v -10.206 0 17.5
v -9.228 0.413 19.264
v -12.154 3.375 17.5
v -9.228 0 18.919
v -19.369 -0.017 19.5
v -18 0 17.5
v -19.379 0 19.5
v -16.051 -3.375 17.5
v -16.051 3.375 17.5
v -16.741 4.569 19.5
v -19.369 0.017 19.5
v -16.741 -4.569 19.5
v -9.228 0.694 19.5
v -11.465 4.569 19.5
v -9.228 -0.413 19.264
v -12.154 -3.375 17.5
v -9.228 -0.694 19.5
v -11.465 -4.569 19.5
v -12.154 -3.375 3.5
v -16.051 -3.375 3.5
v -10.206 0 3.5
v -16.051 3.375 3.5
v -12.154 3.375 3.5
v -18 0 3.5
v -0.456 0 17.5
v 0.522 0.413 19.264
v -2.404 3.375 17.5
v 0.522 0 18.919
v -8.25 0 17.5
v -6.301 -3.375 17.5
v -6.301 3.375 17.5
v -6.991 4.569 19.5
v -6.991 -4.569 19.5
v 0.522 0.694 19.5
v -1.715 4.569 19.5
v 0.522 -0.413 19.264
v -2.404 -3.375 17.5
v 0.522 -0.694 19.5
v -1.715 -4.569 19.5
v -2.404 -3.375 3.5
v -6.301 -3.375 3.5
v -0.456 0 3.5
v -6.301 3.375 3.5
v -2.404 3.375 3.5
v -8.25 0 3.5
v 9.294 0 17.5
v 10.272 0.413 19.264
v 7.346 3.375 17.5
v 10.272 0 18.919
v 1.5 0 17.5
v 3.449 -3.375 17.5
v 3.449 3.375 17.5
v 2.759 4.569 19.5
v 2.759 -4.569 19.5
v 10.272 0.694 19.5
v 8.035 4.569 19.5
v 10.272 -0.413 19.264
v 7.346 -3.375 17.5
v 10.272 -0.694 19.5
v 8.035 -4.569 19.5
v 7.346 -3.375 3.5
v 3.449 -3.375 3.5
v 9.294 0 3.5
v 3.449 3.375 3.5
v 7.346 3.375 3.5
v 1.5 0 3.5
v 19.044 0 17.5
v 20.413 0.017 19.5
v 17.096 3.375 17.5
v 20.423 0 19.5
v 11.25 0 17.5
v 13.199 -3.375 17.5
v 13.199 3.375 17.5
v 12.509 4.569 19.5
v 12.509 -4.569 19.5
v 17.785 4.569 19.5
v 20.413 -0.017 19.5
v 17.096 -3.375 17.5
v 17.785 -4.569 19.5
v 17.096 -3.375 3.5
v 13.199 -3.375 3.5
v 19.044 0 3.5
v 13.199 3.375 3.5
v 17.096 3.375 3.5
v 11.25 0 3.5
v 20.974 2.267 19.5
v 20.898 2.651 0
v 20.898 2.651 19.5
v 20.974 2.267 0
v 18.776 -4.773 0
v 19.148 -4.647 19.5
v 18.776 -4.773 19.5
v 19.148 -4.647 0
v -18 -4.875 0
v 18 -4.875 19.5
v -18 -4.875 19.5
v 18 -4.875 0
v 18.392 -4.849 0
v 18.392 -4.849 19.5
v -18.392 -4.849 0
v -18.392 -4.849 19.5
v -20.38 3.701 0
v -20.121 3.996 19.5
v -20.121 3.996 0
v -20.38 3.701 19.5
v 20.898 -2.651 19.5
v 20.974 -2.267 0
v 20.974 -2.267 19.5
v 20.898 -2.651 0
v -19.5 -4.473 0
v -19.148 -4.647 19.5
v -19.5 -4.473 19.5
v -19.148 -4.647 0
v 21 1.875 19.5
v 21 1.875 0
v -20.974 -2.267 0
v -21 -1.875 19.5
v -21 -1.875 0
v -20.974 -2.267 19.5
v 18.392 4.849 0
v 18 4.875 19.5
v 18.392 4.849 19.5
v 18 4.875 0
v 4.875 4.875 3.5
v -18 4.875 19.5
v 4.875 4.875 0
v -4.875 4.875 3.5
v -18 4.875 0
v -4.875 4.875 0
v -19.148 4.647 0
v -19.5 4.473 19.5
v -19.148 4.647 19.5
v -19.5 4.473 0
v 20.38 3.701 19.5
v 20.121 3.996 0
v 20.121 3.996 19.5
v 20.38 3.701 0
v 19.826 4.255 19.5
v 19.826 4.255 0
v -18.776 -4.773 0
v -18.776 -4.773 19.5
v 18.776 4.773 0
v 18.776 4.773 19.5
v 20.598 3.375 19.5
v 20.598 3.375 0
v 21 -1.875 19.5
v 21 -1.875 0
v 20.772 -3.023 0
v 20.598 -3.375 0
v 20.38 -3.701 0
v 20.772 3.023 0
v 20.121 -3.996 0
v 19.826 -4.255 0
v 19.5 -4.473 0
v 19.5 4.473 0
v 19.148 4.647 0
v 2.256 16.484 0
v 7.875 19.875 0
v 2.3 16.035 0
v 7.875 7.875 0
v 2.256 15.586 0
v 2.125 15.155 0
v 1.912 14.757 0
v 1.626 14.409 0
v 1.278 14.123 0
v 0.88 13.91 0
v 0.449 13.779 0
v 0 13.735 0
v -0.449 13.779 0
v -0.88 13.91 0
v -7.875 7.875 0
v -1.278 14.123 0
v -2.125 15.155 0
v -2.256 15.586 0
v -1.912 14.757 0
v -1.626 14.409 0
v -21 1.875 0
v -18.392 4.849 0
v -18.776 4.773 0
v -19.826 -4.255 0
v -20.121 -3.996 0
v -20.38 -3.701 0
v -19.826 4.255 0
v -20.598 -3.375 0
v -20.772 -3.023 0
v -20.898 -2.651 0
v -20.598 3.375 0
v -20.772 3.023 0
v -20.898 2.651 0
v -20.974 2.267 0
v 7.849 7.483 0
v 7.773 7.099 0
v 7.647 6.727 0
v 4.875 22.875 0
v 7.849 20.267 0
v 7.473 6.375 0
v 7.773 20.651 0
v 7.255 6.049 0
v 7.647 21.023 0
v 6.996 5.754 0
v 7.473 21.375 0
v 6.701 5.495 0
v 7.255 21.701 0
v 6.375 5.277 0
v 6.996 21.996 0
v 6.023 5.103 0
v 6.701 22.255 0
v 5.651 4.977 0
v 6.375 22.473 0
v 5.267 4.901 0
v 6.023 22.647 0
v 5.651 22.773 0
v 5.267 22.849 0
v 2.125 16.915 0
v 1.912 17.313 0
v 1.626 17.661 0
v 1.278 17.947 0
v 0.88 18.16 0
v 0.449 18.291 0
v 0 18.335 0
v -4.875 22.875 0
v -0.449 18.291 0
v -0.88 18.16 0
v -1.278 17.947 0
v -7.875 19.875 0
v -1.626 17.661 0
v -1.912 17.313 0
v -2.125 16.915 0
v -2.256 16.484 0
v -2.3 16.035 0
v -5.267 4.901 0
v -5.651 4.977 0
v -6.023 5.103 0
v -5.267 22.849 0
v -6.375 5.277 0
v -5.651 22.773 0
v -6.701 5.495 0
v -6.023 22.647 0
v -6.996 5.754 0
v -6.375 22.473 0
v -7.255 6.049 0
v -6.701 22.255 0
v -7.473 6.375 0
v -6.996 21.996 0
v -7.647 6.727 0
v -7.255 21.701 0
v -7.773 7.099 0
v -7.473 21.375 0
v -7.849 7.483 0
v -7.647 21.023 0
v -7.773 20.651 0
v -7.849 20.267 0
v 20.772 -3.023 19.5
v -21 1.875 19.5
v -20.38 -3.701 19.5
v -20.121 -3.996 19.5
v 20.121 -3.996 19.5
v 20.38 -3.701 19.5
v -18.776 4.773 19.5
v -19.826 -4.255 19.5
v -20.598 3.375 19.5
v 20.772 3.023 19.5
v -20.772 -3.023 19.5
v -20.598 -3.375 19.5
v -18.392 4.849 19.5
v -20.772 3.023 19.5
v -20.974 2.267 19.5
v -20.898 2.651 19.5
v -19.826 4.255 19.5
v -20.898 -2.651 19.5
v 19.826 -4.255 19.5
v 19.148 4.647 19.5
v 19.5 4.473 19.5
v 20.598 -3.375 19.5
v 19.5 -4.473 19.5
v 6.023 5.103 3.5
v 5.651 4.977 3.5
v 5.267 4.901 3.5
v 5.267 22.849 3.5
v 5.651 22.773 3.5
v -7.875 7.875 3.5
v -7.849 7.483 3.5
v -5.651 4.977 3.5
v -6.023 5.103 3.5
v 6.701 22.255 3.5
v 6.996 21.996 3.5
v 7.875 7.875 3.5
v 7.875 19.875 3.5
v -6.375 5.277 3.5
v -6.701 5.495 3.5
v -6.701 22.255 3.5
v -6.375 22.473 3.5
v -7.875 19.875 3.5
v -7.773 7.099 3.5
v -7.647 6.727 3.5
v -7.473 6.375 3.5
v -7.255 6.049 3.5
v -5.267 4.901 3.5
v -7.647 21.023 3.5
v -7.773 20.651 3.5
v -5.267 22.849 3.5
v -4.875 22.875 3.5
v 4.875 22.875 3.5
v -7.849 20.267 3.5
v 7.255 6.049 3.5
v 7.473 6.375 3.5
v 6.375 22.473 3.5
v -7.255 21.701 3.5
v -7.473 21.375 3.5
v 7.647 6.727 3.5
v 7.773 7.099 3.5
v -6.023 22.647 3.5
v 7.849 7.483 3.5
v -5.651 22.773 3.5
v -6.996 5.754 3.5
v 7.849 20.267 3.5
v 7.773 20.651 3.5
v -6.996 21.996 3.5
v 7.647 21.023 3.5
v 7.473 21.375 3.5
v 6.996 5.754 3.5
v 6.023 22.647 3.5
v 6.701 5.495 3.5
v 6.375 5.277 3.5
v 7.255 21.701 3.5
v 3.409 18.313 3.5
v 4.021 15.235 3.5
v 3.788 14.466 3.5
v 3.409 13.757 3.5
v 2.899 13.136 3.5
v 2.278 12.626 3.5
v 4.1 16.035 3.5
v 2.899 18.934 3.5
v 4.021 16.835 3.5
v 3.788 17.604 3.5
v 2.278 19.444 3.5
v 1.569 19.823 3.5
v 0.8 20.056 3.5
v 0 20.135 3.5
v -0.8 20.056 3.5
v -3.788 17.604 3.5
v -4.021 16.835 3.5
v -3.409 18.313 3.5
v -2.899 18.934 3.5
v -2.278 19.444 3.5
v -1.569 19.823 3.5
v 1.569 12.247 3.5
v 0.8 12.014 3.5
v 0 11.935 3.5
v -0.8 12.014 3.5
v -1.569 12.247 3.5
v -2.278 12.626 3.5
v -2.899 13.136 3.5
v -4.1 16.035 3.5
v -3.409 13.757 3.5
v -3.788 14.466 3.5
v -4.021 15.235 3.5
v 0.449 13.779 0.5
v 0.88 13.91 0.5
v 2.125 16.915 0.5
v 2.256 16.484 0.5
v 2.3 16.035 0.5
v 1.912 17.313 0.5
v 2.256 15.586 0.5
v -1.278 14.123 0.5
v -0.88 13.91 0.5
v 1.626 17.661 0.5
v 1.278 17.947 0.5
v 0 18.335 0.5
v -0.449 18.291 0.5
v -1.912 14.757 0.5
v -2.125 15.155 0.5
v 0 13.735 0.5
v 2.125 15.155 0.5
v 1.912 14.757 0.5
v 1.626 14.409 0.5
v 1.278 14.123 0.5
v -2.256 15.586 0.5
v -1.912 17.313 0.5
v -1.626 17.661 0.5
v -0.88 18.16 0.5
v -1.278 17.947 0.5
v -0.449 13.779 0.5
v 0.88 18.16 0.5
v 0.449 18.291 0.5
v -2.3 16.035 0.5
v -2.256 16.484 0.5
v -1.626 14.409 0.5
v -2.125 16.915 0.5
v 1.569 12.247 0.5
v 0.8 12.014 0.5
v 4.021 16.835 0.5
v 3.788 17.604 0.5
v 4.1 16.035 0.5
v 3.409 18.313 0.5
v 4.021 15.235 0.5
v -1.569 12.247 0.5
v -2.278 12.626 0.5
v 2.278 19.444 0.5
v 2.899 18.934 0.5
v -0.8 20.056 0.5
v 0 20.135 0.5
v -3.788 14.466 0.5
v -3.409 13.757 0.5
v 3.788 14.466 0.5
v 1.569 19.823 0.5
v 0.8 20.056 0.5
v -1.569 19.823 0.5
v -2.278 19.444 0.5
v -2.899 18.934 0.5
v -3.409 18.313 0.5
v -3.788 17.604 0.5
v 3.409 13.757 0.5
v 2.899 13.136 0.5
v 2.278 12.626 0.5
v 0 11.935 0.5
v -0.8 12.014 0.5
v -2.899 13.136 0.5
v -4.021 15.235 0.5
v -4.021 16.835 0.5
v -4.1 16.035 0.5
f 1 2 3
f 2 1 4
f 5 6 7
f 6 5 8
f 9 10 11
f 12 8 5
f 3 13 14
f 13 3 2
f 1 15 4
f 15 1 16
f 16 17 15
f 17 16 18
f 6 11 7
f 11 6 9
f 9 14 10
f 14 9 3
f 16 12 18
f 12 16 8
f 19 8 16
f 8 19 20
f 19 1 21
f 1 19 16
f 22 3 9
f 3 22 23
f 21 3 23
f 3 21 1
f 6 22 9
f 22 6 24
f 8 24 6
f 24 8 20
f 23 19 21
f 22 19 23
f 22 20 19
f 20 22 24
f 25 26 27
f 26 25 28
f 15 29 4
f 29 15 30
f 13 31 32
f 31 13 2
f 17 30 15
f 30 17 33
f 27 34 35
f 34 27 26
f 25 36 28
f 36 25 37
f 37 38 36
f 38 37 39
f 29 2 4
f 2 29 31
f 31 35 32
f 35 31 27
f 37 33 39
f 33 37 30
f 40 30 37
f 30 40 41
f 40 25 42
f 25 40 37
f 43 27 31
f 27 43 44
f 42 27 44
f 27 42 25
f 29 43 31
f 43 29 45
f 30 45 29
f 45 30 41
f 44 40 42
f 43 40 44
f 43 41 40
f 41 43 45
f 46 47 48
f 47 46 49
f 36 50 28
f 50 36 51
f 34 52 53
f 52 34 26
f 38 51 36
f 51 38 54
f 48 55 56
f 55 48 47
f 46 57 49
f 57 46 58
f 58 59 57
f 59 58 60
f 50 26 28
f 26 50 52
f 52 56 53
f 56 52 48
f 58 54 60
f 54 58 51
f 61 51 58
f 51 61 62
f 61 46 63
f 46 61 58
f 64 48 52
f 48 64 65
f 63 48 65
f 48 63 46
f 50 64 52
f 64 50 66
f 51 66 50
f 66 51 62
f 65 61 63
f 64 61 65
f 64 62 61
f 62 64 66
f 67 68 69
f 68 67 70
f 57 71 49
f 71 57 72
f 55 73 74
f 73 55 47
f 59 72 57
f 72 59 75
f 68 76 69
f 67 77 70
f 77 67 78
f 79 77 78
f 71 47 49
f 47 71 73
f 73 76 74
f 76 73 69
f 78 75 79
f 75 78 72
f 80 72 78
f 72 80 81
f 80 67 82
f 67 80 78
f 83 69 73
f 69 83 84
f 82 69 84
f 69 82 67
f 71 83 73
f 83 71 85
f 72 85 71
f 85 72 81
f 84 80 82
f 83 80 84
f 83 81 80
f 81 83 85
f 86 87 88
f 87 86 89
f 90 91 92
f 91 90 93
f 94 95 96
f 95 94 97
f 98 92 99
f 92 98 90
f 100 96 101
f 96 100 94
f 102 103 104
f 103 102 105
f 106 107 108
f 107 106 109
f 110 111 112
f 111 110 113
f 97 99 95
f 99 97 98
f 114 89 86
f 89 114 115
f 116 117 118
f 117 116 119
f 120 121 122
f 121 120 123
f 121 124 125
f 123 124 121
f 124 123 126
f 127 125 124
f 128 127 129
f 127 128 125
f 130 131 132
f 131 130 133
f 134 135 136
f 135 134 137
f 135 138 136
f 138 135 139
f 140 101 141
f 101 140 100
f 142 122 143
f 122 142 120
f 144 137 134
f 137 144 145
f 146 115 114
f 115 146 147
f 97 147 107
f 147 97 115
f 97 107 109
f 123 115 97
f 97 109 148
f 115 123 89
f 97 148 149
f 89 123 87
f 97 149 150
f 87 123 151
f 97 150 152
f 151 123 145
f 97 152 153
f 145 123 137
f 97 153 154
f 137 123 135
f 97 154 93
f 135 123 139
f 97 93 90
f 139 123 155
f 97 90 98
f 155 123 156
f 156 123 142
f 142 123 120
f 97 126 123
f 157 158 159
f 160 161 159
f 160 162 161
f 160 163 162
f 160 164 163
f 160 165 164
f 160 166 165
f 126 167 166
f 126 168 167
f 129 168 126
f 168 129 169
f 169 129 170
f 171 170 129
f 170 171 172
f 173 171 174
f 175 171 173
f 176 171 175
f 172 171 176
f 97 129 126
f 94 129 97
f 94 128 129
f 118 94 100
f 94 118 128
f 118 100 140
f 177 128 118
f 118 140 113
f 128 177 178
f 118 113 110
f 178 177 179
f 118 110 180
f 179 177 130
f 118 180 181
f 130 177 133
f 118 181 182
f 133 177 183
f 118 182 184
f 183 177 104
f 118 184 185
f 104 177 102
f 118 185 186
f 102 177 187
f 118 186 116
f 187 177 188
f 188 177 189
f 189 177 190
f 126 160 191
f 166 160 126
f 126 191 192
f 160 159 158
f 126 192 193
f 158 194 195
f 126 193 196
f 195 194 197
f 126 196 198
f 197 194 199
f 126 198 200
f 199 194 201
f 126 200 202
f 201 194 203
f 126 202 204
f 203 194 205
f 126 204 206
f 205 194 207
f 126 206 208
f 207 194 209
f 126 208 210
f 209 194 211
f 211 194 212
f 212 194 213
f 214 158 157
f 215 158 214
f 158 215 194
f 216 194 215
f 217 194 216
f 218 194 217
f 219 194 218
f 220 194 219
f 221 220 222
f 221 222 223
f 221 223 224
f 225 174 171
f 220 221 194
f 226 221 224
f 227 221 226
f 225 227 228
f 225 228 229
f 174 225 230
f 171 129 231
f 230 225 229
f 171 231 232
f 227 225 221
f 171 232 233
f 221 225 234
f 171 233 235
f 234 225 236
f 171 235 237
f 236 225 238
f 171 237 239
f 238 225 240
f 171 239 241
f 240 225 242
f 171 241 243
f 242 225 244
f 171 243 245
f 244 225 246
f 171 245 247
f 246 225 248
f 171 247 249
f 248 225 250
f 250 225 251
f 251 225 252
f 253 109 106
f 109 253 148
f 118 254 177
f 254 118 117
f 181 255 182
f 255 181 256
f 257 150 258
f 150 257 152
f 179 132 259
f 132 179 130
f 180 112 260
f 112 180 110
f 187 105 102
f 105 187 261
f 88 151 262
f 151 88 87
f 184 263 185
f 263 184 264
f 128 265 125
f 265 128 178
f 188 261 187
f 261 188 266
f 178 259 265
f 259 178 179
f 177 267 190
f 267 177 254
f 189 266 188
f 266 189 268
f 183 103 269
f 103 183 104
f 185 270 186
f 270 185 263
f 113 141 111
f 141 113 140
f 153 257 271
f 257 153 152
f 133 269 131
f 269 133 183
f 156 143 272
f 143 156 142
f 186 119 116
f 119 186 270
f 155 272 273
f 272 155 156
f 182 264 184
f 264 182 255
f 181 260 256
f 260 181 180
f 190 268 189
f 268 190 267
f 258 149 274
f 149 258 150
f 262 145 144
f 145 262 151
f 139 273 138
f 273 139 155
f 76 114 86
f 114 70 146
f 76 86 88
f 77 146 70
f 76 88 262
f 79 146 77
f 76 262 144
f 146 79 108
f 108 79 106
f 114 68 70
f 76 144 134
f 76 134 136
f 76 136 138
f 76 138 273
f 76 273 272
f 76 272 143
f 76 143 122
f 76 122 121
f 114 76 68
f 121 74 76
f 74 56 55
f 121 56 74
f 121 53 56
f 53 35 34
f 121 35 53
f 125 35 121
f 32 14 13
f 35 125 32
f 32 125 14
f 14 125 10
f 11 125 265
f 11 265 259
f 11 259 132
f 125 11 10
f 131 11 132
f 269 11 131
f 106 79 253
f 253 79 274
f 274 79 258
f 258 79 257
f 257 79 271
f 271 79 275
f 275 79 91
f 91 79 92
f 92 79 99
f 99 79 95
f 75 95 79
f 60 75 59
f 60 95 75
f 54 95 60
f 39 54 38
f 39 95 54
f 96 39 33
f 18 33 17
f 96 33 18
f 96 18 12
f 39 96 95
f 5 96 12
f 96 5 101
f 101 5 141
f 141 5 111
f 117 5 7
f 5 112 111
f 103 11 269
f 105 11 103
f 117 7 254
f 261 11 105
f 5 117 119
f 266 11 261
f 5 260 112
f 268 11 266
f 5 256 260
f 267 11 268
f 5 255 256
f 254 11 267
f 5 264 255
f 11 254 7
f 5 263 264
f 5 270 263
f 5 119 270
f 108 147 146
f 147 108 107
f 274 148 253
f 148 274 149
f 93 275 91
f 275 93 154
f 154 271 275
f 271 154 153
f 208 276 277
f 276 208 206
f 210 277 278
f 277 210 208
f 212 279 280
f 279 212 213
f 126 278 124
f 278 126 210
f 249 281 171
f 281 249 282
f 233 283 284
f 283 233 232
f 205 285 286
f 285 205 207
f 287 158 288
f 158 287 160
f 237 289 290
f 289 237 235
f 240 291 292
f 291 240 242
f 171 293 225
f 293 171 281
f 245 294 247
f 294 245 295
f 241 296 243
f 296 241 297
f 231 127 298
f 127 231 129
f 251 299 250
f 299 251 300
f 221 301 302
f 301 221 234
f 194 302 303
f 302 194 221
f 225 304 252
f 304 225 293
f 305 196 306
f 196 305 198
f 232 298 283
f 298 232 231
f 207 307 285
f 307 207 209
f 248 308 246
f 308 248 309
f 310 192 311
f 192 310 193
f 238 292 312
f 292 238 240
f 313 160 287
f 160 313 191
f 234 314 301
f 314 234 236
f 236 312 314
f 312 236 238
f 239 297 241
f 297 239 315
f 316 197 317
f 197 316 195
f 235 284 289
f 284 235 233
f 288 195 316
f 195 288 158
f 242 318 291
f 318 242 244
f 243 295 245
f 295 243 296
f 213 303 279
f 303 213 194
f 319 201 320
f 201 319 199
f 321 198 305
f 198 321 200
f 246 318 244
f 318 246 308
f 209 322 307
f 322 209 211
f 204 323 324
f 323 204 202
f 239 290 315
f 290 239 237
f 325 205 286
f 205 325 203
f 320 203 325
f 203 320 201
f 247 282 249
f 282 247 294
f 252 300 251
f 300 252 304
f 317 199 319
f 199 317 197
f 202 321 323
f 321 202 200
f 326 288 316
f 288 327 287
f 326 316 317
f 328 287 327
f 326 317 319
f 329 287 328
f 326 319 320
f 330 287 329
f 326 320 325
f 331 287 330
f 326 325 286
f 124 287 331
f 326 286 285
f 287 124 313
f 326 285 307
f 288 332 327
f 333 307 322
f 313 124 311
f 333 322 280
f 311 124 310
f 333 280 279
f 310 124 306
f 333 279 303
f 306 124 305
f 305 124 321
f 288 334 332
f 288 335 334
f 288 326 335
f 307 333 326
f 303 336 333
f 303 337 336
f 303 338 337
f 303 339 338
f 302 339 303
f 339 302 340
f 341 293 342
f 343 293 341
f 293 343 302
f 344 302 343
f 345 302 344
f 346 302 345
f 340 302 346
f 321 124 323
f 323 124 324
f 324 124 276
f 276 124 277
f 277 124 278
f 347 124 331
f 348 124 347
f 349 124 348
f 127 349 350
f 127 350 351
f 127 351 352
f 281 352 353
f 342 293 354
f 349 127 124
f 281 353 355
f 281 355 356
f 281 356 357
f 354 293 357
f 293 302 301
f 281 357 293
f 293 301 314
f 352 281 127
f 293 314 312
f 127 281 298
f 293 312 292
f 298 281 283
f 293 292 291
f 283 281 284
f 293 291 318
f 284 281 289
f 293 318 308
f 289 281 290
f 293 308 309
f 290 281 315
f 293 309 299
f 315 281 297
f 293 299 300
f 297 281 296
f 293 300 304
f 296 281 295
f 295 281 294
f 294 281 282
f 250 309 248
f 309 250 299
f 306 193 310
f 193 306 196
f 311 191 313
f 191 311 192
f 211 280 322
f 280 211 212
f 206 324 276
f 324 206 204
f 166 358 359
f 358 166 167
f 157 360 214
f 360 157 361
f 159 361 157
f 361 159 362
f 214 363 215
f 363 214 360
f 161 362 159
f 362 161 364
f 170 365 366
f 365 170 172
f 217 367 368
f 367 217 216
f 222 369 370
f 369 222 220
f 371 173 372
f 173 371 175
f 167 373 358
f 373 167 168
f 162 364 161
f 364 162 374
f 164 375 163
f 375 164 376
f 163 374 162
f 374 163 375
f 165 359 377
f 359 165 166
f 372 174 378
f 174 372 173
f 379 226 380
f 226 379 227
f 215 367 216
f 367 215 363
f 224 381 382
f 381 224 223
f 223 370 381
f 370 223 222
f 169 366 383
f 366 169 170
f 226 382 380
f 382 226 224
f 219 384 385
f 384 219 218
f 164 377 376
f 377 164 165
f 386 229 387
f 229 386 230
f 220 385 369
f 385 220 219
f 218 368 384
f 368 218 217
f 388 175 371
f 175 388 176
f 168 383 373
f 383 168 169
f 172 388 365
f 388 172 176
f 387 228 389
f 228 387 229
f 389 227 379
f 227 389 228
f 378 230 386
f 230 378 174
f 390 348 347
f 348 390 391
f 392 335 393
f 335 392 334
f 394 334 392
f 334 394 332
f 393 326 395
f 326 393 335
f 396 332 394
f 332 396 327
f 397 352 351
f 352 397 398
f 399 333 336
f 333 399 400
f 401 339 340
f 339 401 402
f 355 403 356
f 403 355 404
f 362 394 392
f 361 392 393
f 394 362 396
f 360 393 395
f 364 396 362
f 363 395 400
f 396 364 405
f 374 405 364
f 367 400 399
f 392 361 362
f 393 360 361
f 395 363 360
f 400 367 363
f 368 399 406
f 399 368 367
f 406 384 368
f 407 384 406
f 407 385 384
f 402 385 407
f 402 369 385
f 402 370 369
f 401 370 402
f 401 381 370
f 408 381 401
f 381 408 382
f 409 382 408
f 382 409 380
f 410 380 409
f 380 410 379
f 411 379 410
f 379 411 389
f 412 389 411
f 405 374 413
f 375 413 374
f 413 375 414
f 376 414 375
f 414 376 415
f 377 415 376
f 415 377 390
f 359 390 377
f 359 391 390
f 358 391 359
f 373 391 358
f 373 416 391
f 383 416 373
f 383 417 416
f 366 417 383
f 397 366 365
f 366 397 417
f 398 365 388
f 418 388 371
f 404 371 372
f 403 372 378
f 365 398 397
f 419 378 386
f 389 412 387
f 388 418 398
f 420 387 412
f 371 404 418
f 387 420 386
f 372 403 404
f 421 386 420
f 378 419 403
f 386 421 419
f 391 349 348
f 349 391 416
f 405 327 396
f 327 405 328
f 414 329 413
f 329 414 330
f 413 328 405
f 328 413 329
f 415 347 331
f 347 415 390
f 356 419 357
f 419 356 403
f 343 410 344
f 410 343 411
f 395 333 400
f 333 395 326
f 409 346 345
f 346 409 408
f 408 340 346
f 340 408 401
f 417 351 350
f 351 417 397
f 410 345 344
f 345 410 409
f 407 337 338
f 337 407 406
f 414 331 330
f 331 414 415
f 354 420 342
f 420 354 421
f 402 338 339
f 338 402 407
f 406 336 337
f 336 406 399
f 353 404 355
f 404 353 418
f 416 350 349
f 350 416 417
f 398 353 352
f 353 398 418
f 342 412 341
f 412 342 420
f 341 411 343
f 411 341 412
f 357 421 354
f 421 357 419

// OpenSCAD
// DCF850 impact bit holder
//
// A screw-mounted holder for 4 spare 1/4" hex impact bits that
// attaches to a Dewalt DCF850 (and most Dewalt 20V Max compact
// impact driver/drill) using the same single M4 screw and threaded
// hole that normally holds the factory belt clip on the side of the
// tool's handle.
//
// The mounting tab is a flat plate with a single clearance hole and a
// counterbore for the screw head, sized to match the stock belt-clip
// screw (M4, ~8 mm long). Because it is a single-point screw mount
// (like the stock belt clip), rotate the part to the desired angle
// before fully tightening the screw -- friction against the tool
// body plus screw tension hold it in place, there is no keyed
// anti-rotation feature.
//
// Render selector: "holder" (the printable part) or "assembled"
// (identical geometry, used for the preview render).
part = "assembled"; // [holder, assembled]

// ---- Bit fit parameters ----
// Standard 1/4" hex bit shank measured across flats (impact bits use
// the same shank size as regular hex-shank bits).
hex_flat_to_flat = 6.35;
// Extra room added to the shank size so bits slide in snugly but
// still hold under friction. Increase slightly if bits are too tight,
// decrease if they fall out.
hex_clearance = 0.4;
hex_hole_size = hex_flat_to_flat + hex_clearance;

// Depth of straight hex socket that grips the bit shank.
socket_depth = 14;
// Extra tapered lead-in at the top of each socket to make it easy to
// find and start inserting a bit.
lead_in_height = 2;
// How much wider the lead-in mouth is than the socket, per side.
lead_in_oversize = 1.2;

// ---- Grid layout ----
// Single row of 4 bits keeps the holder slim against the tool body.
bit_count = 4;
// Solid wall thickness left between adjacent hex holes and around the
// outer edge of the block.
wall_thickness = 3;

// ---- Base plate (bit block) ----
base_thickness = 3.5;
corner_radius = 3;

block_height = base_thickness + socket_depth + lead_in_height;
hex_pitch = hex_hole_size + wall_thickness;

block_width = bit_count * hex_pitch + wall_thickness;
block_depth = hex_pitch;

// ---- Mounting tab ----
// Matches the stock Dewalt belt-clip screw: M4 machine screw, ~8 mm
// long. Sized generously so it can be trimmed/filed to fit the exact
// curve of the handle if needed.
mount_screw_clearance_d = 4.6;
mount_head_d = 8.2;
mount_head_depth = 3;
mount_tab_width = block_depth + 6;
mount_tab_length = 18;
mount_tab_thickness = base_thickness;

mount_rect_fn = 48;

module rounded_rect(width, depth, radius, height) {
    linear_extrude(height = height)
        offset(r = radius, $fn = mount_rect_fn)
            offset(delta = -radius)
                square([width, depth], center = true);
}

module hex_hole(size, depth) {
    // Flat-to-flat sized hexagon: circumscribed circle diameter = size / cos(30)
    hole_d = size / cos(30);
    lead_d = (size + 2 * lead_in_oversize) / cos(30);

    translate([0, 0, block_height - lead_in_height])
        cylinder(h = lead_in_height + 0.01, d1 = hole_d, d2 = lead_d, $fn = 6);

    translate([0, 0, block_height - lead_in_height - depth])
        cylinder(h = depth + lead_in_height + 0.02, d = hole_d, $fn = 6);
}

module bit_block() {
    difference() {
        rounded_rect(block_width, block_depth, corner_radius, block_height);

        x_start = -block_width / 2 + wall_thickness + hex_hole_size / cos(30) / 2;

        for (i = [0 : bit_count - 1])
            translate([x_start + i * hex_pitch, 0, 0])
                hex_hole(hex_hole_size, socket_depth);
    }
}

module mount_tab() {
    difference() {
        translate([0, mount_tab_length / 2, 0])
            rounded_rect(mount_tab_width, mount_tab_length, corner_radius, mount_tab_thickness);

        // Through hole for the M4 screw shaft.
        translate([0, mount_tab_length * 0.62, -0.1])
            cylinder(h = mount_tab_thickness + 0.2, d = mount_screw_clearance_d, $fn = 32);

        // Counterbore on the outward face so the screw head sits flush.
        translate([0, mount_tab_length * 0.62, mount_tab_thickness - mount_head_depth])
            cylinder(h = mount_head_depth + 0.1, d = mount_head_d, $fn = 32);
    }
}

module bit_holder() {
    union() {
        bit_block();
        translate([0, block_depth / 2, 0])
            mount_tab();
    }
}

if (part == "holder" || part == "assembled") {
    bit_holder();
}
